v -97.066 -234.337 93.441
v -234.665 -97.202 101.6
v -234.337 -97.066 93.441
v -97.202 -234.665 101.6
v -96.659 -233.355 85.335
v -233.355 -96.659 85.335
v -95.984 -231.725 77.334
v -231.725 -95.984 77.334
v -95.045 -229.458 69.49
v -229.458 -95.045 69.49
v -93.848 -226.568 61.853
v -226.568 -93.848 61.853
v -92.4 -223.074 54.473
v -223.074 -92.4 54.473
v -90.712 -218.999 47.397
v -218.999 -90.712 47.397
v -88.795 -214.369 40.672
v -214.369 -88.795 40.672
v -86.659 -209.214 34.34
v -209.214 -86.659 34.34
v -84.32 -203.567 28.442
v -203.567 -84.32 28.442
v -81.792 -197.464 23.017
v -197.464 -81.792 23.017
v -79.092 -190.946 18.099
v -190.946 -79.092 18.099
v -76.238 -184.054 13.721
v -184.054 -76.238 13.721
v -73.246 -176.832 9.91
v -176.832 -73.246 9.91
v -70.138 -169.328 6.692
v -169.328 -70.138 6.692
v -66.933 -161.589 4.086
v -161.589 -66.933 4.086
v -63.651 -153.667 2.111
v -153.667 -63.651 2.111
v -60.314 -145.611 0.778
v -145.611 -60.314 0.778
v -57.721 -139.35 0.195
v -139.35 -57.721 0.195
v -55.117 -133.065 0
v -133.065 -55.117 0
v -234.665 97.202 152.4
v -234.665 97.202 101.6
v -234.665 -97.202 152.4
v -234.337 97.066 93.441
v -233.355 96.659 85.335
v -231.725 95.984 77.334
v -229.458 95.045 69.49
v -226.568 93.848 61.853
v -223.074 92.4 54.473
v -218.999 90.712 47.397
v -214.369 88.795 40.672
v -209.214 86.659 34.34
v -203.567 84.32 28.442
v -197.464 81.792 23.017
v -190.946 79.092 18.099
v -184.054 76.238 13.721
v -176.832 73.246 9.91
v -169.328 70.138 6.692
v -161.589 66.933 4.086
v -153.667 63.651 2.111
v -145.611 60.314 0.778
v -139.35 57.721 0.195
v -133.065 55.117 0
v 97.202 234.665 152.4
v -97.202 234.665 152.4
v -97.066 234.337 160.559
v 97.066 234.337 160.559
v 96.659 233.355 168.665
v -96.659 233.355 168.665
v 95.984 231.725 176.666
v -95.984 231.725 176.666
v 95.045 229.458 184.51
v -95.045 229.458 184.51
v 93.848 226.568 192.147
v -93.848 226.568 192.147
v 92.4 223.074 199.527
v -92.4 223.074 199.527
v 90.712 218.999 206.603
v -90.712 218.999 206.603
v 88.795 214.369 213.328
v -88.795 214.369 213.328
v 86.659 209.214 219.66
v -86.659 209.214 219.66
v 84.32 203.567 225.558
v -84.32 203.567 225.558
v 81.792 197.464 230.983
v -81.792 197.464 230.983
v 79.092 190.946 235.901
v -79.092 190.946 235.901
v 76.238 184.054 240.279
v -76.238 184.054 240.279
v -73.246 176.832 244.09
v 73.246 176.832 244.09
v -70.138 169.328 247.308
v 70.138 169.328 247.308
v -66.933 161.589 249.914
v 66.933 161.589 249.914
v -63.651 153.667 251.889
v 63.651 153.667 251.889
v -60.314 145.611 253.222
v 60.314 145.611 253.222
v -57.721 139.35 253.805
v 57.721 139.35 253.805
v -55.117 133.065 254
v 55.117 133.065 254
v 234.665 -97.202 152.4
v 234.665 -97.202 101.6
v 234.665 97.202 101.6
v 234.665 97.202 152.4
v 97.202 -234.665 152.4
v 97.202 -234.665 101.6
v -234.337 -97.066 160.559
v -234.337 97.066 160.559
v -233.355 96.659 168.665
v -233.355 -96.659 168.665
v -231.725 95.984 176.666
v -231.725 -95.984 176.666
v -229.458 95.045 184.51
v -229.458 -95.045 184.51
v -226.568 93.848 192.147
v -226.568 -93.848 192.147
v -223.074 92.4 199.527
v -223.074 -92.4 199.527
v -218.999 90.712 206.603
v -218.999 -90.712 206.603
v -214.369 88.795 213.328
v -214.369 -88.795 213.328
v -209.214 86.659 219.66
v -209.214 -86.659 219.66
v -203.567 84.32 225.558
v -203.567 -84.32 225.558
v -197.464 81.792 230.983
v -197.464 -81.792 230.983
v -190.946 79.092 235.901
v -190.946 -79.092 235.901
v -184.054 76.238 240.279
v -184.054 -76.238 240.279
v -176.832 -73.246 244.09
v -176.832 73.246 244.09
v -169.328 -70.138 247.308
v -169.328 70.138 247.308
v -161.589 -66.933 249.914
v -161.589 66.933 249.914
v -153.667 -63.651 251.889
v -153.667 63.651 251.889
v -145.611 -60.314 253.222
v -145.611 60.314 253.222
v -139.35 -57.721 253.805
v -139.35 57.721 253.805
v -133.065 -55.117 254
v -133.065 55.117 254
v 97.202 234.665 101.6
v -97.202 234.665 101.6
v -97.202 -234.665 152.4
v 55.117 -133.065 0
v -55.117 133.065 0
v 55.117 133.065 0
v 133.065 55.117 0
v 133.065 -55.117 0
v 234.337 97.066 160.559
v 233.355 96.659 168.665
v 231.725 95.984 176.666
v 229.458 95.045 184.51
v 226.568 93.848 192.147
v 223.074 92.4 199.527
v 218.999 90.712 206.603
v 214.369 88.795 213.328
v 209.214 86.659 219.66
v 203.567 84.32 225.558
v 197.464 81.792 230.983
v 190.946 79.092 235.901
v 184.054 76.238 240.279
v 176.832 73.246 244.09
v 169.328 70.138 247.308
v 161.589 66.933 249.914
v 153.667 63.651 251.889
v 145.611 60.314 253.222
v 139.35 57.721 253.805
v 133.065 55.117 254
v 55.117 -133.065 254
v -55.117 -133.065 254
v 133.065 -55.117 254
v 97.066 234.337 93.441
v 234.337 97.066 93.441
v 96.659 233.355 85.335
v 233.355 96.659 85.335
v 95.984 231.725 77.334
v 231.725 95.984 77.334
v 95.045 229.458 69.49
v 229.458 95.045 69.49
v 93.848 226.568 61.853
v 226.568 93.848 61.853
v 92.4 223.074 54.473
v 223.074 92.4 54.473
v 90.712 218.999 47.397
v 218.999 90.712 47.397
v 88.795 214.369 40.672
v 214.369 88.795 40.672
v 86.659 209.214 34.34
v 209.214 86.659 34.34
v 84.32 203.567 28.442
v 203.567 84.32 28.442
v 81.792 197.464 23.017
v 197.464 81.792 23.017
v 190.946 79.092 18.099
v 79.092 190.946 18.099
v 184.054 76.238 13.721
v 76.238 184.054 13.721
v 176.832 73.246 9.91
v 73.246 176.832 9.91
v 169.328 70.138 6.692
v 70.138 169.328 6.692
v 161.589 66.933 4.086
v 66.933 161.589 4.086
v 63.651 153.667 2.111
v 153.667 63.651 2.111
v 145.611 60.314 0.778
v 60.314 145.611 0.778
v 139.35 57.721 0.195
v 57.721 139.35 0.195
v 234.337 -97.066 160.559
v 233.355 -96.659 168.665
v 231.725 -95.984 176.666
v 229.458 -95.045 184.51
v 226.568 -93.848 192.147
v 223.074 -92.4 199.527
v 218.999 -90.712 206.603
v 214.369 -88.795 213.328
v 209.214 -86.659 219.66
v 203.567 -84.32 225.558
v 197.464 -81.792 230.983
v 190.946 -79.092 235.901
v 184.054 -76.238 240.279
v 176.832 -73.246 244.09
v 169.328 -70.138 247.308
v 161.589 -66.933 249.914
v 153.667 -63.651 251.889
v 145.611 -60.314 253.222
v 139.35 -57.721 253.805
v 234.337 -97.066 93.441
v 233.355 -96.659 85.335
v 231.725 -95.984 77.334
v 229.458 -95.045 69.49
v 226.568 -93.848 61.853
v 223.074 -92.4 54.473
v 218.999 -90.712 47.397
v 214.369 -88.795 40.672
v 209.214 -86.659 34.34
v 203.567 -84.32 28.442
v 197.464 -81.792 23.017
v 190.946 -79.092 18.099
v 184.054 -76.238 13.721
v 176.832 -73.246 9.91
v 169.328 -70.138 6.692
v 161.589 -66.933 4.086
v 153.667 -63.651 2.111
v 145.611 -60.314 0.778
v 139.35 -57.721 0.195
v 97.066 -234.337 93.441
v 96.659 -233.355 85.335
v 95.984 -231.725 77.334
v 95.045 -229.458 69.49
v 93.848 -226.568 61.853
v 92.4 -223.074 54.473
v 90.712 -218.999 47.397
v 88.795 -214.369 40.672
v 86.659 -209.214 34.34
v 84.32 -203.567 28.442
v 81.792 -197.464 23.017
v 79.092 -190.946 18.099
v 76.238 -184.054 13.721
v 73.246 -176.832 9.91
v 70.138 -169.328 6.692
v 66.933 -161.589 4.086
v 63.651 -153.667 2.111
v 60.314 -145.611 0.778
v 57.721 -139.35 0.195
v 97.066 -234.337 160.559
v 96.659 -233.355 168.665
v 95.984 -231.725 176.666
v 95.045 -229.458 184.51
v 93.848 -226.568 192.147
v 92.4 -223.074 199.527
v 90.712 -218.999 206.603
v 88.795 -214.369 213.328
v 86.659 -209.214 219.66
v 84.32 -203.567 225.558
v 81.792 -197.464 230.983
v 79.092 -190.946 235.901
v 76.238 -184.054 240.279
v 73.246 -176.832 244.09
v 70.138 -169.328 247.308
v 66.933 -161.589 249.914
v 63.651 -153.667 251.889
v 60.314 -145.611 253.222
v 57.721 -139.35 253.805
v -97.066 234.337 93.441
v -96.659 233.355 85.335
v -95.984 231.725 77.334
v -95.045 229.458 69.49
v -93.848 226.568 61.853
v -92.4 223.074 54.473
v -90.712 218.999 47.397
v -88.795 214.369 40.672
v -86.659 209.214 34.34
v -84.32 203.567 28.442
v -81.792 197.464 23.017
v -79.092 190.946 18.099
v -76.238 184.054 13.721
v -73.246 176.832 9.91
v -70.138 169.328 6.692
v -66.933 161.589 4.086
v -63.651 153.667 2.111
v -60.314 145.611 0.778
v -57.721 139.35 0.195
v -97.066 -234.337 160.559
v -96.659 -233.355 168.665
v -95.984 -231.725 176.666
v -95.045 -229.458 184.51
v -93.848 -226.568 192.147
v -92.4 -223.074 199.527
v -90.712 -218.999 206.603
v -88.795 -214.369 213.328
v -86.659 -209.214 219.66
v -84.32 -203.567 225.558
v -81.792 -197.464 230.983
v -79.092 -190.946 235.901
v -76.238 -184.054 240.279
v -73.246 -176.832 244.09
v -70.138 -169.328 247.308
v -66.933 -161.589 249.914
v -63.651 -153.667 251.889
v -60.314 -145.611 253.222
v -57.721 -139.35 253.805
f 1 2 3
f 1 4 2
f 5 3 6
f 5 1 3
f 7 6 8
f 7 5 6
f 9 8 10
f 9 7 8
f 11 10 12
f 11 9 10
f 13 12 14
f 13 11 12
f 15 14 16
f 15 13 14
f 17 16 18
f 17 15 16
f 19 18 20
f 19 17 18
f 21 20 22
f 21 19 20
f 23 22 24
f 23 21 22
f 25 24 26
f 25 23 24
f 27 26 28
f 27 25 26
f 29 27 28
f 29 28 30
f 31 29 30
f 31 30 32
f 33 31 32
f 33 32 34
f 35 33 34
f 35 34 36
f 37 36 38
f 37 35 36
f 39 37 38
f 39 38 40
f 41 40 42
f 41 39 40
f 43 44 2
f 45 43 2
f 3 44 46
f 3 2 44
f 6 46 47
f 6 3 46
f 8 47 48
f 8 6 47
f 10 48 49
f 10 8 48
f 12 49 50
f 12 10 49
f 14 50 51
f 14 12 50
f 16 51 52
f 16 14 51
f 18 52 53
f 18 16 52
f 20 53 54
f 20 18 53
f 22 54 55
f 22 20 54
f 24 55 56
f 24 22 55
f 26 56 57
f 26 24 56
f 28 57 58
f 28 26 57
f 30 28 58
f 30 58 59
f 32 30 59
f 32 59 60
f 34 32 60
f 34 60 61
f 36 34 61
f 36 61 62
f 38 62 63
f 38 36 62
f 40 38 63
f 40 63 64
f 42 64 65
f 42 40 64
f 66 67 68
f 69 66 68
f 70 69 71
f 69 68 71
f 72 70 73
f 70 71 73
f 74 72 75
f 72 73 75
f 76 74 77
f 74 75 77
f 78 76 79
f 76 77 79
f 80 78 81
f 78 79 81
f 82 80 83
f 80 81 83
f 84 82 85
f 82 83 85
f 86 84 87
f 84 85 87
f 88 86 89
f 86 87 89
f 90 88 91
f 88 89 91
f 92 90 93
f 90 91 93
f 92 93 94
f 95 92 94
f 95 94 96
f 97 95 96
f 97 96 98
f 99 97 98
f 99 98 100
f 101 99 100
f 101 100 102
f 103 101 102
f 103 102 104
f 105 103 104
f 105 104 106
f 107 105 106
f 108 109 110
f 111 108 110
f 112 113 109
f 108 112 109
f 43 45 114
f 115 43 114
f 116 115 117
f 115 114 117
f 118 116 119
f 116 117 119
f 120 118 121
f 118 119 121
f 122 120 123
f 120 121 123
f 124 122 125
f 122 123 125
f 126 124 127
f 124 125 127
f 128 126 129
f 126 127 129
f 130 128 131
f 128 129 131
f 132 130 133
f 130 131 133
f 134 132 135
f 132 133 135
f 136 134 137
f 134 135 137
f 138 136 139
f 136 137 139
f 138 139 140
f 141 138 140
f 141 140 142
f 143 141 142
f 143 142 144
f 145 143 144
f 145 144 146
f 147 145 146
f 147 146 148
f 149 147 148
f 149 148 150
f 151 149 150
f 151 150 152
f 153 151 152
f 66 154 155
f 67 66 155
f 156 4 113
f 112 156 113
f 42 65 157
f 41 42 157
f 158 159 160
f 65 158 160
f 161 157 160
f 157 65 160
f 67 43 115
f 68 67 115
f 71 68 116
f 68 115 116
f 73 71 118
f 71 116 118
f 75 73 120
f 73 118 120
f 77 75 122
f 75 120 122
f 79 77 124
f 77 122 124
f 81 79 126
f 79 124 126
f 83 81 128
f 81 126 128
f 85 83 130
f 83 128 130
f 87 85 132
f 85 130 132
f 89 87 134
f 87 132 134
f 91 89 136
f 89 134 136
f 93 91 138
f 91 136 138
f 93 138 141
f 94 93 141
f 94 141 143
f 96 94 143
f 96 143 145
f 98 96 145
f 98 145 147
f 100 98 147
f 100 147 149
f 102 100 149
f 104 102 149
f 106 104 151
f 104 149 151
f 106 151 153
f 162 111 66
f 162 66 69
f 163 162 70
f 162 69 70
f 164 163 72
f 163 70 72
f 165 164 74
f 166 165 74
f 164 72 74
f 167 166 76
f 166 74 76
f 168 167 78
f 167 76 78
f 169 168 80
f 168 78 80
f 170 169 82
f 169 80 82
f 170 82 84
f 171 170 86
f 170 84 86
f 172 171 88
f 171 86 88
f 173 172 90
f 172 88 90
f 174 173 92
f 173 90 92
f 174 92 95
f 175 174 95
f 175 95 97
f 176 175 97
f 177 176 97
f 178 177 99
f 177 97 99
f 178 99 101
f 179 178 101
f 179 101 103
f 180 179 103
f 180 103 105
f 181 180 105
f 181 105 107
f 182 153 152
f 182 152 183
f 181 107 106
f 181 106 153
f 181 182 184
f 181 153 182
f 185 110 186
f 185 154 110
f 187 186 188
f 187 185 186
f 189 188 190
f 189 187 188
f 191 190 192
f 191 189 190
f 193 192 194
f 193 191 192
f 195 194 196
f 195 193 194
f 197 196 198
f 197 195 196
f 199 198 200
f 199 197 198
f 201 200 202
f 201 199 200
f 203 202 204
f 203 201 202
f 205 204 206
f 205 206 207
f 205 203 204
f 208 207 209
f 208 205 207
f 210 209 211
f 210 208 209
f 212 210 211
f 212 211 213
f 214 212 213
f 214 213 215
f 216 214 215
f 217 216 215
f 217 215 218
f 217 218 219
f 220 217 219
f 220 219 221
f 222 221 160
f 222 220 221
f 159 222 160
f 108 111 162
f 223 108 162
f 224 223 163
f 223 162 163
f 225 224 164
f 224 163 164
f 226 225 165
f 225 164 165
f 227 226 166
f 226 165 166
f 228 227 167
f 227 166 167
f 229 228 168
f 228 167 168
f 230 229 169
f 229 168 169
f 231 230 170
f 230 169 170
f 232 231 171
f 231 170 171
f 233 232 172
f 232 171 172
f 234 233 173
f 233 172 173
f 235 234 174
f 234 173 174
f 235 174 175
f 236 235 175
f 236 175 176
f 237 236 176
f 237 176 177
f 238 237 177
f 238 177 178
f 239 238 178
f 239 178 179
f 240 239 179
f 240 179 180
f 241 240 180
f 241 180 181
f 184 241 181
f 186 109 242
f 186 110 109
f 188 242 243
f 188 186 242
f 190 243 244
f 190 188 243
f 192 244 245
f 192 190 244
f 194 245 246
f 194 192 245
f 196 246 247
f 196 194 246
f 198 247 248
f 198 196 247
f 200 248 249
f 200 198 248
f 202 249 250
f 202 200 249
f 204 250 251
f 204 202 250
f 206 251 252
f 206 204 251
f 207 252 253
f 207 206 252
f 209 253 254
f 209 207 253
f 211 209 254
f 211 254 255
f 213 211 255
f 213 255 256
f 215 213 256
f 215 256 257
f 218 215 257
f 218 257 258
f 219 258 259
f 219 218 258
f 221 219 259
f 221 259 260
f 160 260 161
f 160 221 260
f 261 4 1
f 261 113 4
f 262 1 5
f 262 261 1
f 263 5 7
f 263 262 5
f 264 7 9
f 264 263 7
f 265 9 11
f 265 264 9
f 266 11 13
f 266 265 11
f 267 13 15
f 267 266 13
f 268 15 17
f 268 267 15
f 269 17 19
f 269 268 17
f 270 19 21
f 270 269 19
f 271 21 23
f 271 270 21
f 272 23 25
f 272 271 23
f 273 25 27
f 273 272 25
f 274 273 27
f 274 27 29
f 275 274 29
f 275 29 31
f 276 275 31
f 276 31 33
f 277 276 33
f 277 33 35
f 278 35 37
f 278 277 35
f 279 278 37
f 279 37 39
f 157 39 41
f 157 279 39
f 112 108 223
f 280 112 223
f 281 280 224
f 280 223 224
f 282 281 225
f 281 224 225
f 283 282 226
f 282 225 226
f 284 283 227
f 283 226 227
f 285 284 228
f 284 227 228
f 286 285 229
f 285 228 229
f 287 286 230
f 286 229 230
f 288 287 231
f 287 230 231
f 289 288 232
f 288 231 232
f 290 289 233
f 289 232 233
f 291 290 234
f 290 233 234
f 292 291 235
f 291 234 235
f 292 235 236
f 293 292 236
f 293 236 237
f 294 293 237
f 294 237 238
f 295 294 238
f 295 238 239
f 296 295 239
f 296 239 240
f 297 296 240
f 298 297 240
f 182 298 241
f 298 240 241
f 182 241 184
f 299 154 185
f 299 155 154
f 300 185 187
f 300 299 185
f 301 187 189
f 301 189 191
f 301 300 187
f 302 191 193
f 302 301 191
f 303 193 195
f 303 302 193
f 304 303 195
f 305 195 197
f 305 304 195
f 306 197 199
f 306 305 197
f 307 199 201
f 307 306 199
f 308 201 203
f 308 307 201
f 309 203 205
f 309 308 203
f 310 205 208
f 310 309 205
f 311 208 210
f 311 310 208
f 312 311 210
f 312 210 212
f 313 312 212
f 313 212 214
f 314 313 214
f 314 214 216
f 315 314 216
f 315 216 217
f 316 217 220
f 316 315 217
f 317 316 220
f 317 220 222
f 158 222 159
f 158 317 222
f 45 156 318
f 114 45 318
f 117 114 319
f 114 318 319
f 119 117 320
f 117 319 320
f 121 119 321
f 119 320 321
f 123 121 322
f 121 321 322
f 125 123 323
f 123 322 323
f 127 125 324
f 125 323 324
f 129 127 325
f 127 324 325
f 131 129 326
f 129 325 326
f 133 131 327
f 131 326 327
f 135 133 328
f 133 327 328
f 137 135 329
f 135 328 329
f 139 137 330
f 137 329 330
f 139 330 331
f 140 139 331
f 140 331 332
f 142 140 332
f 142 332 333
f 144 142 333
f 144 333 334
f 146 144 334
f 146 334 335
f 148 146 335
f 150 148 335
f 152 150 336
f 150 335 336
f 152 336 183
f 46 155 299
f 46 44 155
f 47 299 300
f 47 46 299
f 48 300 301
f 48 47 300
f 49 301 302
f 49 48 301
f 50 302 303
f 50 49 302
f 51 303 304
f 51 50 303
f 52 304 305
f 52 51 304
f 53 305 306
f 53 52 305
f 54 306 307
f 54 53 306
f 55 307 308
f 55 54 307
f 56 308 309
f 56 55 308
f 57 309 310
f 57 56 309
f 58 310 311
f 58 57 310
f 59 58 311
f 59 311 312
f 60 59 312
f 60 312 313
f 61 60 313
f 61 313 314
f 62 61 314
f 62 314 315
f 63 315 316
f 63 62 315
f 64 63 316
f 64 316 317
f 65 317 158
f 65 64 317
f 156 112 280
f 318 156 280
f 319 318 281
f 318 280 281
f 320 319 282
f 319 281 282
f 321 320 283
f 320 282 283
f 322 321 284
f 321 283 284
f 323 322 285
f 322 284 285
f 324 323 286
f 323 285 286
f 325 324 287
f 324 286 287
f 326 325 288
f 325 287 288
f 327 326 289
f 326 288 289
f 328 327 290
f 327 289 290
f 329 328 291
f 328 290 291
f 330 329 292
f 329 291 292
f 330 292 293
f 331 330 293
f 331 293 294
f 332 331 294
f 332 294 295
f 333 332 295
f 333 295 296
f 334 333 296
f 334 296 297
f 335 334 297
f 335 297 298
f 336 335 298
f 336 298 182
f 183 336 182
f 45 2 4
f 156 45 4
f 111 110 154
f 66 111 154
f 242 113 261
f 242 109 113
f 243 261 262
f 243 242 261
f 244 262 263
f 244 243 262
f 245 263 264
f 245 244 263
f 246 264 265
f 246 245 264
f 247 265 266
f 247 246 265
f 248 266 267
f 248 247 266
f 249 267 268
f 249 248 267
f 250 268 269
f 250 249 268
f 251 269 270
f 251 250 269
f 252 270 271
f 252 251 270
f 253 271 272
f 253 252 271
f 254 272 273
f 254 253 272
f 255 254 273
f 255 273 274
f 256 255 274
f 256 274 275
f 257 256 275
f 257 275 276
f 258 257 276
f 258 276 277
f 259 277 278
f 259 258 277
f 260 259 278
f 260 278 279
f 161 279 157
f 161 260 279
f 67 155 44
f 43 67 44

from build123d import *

# Parameters (mm, degrees)
F1_DEPTH = 254
F2_R     = 101.6


with BuildPart() as f1:
    # F0 (on Top) → F1 (new body)
    with BuildSketch(Plane.XY):
        Polygon((97.201592, 234.665401), (-97.201592, 234.665401), (-234.665401, 97.201592), (-234.665401, -97.201592), (-97.201592, -234.665401), (97.201592, -234.665401), (234.665401, -97.201592), (234.665401, 97.201592), align=None)
    extrude(amount=F1_DEPTH)

    # F2
    f2_edges = [f1.edges().sort_by_distance(p)[0] for p in [
        (0, 234.665401, 0),
        (-165.933497, 165.933497, 0),
        (-234.665401, 0, 0),
        (-165.933497, -165.933497, 0),
        (0, -234.665401, 0),
        (165.933497, -165.933497, 0),
        (234.665401, 0, 0),
        (165.933497, 165.933497, 0),
        (0, 234.665401, 254),
        (-165.933497, 165.933497, 254),
        (-234.665401, 0, 254),
        (-165.933497, -165.933497, 254),
        (0, -234.665401, 254),
        (165.933497, -165.933497, 254),
        (234.665401, 0, 254),
        (165.933497, 165.933497, 254),
    ]]
    fillet(f2_edges, radius=F2_R)


solid = f1.part
